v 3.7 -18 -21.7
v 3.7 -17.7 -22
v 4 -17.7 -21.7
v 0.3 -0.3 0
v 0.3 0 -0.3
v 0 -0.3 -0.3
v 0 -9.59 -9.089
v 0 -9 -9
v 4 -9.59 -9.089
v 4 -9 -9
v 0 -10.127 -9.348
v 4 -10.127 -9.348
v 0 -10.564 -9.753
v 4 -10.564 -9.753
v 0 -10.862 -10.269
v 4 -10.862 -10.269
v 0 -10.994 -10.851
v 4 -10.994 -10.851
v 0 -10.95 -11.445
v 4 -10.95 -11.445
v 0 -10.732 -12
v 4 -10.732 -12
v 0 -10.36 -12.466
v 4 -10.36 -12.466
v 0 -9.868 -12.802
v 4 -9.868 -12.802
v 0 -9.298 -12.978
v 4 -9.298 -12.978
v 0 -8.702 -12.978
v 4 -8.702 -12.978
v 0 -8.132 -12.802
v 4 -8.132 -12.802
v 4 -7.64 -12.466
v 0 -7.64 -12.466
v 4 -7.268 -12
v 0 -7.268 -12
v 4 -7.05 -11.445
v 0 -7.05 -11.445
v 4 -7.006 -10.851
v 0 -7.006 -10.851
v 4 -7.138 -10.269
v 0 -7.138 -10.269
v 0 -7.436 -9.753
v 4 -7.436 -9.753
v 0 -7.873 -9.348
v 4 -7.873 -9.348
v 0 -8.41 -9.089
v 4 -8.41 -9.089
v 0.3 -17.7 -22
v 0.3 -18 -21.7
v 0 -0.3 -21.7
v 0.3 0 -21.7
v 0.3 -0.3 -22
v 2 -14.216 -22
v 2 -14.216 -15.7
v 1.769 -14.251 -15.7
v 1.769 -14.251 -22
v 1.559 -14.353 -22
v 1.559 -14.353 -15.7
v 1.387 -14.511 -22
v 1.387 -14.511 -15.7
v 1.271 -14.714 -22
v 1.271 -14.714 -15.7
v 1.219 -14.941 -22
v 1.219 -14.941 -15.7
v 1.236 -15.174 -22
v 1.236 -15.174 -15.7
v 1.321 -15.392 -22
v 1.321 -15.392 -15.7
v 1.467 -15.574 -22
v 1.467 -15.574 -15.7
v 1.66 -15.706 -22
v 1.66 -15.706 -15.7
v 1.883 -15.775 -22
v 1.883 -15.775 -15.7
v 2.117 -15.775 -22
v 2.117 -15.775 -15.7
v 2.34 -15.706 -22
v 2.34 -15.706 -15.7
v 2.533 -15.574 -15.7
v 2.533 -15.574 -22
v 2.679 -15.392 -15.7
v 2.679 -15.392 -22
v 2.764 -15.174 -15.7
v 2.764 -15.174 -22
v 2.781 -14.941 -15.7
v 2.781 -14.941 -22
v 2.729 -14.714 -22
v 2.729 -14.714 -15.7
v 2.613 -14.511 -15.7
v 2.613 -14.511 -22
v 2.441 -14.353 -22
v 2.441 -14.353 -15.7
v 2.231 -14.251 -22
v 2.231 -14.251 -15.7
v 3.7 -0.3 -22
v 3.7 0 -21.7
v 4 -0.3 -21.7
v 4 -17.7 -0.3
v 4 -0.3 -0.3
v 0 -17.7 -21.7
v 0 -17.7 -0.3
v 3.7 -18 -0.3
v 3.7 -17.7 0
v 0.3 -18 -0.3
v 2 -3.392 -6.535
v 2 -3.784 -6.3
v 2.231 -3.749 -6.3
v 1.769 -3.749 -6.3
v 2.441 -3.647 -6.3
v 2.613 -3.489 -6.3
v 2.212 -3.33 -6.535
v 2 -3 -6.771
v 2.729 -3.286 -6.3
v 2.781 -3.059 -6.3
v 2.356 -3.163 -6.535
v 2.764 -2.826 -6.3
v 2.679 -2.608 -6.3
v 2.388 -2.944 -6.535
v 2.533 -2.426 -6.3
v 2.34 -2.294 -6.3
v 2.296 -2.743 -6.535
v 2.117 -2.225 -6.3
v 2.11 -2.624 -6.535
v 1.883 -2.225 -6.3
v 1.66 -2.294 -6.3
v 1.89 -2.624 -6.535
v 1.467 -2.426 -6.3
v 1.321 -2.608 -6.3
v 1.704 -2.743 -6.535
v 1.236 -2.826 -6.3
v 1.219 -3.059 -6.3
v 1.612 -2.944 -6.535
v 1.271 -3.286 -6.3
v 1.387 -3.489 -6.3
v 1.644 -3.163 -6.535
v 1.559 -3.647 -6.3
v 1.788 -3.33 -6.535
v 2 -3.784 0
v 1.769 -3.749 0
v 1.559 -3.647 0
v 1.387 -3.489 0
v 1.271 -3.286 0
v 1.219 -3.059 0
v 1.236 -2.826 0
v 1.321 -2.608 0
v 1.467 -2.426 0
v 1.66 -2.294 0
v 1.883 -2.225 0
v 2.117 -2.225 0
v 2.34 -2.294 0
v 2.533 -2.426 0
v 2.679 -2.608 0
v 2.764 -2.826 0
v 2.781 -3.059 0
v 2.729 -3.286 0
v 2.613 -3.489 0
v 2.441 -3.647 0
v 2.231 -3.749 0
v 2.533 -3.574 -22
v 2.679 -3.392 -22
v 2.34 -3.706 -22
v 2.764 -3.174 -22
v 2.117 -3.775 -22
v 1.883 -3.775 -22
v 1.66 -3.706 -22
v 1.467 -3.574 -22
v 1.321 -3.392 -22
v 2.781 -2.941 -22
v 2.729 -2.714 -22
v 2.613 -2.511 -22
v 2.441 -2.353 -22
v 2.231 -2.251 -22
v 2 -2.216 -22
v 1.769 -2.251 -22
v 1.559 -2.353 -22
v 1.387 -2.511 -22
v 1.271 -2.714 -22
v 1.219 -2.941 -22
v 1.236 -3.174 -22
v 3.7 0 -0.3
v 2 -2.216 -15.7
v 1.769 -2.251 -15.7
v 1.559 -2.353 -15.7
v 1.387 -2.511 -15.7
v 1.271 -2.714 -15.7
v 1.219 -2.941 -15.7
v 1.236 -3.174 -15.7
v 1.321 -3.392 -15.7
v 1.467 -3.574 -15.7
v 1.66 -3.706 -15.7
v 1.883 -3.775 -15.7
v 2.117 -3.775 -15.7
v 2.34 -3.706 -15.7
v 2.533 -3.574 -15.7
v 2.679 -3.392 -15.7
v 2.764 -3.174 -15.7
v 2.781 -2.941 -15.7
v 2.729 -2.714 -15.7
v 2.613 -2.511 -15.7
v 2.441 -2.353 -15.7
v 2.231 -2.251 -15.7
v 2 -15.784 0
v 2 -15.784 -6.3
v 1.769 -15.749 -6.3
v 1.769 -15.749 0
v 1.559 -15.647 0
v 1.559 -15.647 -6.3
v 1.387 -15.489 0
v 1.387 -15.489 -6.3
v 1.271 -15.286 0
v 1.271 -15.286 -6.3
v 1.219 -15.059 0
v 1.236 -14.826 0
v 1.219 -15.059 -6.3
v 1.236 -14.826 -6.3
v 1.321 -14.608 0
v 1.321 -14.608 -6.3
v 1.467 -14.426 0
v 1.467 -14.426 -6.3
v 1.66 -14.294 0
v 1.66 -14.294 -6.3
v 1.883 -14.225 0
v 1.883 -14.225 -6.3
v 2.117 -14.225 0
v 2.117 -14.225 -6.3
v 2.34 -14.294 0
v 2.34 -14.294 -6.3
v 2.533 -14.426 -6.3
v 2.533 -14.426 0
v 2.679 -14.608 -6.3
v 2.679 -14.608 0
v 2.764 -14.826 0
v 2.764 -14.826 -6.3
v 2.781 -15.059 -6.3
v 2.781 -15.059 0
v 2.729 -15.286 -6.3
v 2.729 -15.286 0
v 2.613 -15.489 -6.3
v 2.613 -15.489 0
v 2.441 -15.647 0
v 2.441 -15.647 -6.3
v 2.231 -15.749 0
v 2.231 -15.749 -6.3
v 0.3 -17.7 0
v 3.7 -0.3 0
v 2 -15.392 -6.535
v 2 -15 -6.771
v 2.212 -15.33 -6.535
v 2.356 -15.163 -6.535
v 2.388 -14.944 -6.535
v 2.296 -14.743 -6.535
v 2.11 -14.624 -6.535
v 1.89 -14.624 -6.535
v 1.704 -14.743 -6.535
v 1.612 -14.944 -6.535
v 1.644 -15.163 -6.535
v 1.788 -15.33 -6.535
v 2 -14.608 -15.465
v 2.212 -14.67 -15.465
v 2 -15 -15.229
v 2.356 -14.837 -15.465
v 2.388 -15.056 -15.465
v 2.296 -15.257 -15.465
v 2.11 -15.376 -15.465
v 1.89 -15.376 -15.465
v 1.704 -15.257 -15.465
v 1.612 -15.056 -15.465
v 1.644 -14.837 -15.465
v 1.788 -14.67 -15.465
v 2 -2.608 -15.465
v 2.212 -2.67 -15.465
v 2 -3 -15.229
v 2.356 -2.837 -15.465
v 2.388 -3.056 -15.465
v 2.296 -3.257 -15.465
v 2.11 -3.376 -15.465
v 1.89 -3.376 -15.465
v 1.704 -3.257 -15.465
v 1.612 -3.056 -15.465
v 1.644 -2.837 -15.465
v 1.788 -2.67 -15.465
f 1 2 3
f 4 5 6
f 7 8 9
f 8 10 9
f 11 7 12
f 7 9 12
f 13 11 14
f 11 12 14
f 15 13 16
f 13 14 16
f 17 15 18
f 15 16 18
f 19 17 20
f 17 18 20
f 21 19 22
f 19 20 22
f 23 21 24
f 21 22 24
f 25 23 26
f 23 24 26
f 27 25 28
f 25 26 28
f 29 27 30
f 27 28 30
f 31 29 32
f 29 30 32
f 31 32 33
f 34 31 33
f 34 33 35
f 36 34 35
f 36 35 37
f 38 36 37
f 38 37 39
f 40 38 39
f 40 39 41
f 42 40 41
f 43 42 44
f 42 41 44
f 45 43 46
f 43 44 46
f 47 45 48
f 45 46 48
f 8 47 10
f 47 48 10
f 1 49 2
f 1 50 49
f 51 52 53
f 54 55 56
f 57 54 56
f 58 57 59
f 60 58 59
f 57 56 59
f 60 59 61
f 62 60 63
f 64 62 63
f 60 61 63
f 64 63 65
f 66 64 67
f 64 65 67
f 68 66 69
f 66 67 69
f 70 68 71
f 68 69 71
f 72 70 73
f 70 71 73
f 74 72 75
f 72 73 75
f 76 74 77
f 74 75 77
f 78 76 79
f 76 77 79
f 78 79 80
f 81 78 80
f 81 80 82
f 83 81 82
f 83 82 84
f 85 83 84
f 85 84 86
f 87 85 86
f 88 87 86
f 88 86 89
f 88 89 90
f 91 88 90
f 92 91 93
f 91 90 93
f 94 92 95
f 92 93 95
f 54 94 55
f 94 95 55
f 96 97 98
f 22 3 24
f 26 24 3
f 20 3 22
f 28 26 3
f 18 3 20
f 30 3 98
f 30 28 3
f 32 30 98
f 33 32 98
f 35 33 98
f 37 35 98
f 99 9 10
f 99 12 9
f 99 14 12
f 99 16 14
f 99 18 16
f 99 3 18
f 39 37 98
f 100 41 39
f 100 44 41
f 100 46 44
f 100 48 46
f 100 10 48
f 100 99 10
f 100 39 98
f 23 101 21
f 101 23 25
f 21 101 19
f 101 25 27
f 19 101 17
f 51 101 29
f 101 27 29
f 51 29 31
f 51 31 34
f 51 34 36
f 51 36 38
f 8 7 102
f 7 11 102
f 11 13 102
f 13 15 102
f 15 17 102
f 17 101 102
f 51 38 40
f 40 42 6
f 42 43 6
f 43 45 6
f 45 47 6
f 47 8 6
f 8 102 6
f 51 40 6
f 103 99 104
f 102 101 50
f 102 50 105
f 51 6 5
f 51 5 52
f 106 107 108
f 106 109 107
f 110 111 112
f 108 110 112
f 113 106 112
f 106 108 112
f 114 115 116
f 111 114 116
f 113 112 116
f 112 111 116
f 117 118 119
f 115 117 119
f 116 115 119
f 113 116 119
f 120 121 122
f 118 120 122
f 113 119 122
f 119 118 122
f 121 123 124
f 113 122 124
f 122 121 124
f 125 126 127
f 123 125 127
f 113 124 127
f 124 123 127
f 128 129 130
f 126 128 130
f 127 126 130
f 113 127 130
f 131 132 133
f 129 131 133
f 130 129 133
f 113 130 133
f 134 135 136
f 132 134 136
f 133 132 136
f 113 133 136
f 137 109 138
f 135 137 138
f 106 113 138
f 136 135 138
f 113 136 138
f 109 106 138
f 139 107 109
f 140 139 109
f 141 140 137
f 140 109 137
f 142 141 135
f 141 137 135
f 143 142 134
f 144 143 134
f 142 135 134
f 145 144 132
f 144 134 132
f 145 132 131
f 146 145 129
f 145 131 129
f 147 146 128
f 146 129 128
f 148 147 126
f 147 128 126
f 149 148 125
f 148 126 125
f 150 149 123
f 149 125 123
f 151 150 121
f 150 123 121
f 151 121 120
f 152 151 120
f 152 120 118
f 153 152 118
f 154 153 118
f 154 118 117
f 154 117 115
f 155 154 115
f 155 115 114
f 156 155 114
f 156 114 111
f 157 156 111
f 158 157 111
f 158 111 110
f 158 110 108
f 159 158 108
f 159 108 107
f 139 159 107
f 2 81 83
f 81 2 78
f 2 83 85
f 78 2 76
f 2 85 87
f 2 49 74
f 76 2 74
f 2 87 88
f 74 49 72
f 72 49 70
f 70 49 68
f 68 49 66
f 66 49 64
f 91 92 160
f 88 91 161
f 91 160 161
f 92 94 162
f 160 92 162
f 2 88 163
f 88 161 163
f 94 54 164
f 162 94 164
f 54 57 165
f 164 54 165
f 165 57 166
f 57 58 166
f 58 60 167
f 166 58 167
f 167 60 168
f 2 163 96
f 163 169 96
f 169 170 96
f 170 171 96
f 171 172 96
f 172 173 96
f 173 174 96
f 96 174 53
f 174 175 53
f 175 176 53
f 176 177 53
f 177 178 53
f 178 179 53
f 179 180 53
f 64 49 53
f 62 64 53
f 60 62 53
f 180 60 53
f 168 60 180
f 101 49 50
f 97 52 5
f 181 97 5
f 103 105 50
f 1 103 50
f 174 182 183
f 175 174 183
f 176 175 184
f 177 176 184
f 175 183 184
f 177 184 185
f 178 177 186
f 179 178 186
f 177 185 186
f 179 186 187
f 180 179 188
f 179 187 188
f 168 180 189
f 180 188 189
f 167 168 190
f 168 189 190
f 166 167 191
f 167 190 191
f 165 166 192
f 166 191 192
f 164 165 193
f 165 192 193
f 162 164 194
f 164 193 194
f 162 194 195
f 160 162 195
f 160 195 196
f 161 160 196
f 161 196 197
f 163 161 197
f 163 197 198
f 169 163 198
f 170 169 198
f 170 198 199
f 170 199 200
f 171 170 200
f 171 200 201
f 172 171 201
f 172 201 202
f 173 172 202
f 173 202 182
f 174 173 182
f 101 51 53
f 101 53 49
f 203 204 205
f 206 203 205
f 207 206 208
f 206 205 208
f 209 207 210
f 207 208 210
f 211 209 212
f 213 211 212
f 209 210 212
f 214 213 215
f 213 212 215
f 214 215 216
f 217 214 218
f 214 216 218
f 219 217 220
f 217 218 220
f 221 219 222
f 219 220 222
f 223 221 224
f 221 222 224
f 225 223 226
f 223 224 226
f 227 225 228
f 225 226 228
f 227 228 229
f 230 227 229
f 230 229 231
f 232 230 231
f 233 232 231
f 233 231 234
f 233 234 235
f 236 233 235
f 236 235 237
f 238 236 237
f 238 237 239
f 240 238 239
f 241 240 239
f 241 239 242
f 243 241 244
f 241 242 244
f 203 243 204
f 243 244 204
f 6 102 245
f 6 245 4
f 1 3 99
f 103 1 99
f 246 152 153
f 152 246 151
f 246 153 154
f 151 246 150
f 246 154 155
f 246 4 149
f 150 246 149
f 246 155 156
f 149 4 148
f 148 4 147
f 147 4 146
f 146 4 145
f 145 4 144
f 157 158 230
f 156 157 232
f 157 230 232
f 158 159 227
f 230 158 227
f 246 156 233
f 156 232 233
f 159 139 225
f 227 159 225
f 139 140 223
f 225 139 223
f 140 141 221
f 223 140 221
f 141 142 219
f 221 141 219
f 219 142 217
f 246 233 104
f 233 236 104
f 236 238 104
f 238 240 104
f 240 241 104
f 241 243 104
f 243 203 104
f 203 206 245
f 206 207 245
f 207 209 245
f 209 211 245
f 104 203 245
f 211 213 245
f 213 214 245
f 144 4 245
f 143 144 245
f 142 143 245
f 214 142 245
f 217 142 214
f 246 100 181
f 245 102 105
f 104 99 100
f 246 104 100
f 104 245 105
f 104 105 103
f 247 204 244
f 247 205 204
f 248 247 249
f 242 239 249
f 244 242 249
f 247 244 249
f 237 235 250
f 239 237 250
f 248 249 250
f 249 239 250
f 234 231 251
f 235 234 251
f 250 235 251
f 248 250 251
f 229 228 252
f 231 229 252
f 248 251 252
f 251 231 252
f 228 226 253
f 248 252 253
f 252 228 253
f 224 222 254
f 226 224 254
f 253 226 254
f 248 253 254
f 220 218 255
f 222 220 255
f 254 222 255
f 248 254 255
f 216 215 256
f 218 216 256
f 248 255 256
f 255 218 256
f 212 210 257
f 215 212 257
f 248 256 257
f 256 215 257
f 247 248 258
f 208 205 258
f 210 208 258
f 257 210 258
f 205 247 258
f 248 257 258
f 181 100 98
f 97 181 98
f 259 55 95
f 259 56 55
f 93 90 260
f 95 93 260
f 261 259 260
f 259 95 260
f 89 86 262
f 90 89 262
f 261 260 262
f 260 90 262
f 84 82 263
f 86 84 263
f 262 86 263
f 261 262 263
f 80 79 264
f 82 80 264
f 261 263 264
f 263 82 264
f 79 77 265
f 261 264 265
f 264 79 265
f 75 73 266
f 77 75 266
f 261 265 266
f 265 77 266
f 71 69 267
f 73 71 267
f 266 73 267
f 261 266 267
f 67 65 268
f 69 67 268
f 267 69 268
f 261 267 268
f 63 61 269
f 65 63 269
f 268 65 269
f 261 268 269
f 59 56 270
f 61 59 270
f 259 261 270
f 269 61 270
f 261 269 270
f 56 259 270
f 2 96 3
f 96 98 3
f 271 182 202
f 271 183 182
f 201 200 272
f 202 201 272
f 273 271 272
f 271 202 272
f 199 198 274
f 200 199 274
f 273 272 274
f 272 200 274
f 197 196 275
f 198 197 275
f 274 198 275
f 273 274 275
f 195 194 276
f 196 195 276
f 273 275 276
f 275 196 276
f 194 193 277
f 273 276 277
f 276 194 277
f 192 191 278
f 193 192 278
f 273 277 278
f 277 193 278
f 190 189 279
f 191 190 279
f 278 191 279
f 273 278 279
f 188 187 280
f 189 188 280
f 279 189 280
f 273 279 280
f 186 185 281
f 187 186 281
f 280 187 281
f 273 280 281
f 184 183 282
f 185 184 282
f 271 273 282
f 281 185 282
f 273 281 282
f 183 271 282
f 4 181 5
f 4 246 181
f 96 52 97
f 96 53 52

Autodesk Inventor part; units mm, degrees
ref_plane "YZ Plane" through (0, 0, 0) normal (1, 0, 0) x (0, 1, 0)
ref_plane "XZ Plane" through (0, 0, 0) normal (0, 1, 0) x (-1, 0, 0)
ref_plane "XY Plane" through (0, 0, 0) normal (0, 0, 1) x (1, 0, 0)
sketch "Sketch1" plane through (0, 0, 0) normal (1, 0, 0) x (0, 1, 0)
  line L0 (0, 0) -> (-18, 0)
  line L1 (-18, 0) -> (-18, -22)
  line L2 (-18, -22) -> (0, -22)
  line L3 (0, -22) -> (0, 0)
  dimension "d0" = 18
  dimension "d1" = 22
extrude "Extrusion1" add sketch "Sketch1" along normal blind 4
chamfer "Chamfer1" distance 0.3 angle 45 12 edges at (4, 0, -11) (0, 0, -11) (2, 0, -22) (4, -9, 0) (2, 0, 0) (0, -9, -22) (2, -18, -22) (4, -9, -22) (4, -18, -11) (0, -18, -11) (0, -9, 0) (2, -18, 0)
sketch "Sketch2" plane through (0.3, -17.7, 0) normal (0, 0, 1) x (1, 0, 0)
  line L0 (-0.3, 17.4) -> (-0.3, 0) projected
  line L1 (3.4, 17.7) -> (0, 17.7) projected
  line L2 (0, -0.3) -> (3.4, -0.3) projected
  point P0 (-0.3, 17.7)
  point P1 (1.7, 14.7)
  point P2 (1.7, 2.7)
  dimension "d7" = 2
  dimension "d8" = 2
  dimension "d9" = 3
  dimension "d10" = 3
hole "Hole1" at (2, -3, 0) at (2, -15, 0) direction (0, 0, -1) diameter 1.567 depth 6.3 tip angle 118 thread size "M2x0.4" class "6H" standard "ISO Metric profile"
sketch "Sketch3" plane through (3.7, -17.7, -22) normal (0, 0, -1) x (-1, 0, 0)
  circle A0 centre (1.7, 2.7) radius 0.7835 projected
  circle A1 centre (1.7, 14.7) radius 0.7835 projected
  point P0 (3.7, 17.7)
  point P1 (1.7, 2.7)
  point P2 (1.7, 14.7)
hole "Hole2" at (2, -15, -22) at (2, -3, -22) direction (0, 0, 1) diameter 1.567 depth 6.3 tip angle 118 thread size "M2x0.4" class "6H" standard "ISO Metric profile"
sketch "Sketch4" plane through (0, 0, 0) normal (-1, 0, 0) x (0, 0, 1)
  line L0 (-22, -0.3) -> (-22, -17.7) projected
  line L1 (-0.3, 0) -> (-21.7, 0) projected
  point P0 (0, 0)
  point P1 (-11, -9)
  dimension "d25" = 11
  dimension "d26" = 9
hole "Hole3" at (0, -9, -11) direction (1, 0, 0) diameter 4 depth 6.3 tip angle 118
properties part number "Ramka4" material "Steel(1)"
